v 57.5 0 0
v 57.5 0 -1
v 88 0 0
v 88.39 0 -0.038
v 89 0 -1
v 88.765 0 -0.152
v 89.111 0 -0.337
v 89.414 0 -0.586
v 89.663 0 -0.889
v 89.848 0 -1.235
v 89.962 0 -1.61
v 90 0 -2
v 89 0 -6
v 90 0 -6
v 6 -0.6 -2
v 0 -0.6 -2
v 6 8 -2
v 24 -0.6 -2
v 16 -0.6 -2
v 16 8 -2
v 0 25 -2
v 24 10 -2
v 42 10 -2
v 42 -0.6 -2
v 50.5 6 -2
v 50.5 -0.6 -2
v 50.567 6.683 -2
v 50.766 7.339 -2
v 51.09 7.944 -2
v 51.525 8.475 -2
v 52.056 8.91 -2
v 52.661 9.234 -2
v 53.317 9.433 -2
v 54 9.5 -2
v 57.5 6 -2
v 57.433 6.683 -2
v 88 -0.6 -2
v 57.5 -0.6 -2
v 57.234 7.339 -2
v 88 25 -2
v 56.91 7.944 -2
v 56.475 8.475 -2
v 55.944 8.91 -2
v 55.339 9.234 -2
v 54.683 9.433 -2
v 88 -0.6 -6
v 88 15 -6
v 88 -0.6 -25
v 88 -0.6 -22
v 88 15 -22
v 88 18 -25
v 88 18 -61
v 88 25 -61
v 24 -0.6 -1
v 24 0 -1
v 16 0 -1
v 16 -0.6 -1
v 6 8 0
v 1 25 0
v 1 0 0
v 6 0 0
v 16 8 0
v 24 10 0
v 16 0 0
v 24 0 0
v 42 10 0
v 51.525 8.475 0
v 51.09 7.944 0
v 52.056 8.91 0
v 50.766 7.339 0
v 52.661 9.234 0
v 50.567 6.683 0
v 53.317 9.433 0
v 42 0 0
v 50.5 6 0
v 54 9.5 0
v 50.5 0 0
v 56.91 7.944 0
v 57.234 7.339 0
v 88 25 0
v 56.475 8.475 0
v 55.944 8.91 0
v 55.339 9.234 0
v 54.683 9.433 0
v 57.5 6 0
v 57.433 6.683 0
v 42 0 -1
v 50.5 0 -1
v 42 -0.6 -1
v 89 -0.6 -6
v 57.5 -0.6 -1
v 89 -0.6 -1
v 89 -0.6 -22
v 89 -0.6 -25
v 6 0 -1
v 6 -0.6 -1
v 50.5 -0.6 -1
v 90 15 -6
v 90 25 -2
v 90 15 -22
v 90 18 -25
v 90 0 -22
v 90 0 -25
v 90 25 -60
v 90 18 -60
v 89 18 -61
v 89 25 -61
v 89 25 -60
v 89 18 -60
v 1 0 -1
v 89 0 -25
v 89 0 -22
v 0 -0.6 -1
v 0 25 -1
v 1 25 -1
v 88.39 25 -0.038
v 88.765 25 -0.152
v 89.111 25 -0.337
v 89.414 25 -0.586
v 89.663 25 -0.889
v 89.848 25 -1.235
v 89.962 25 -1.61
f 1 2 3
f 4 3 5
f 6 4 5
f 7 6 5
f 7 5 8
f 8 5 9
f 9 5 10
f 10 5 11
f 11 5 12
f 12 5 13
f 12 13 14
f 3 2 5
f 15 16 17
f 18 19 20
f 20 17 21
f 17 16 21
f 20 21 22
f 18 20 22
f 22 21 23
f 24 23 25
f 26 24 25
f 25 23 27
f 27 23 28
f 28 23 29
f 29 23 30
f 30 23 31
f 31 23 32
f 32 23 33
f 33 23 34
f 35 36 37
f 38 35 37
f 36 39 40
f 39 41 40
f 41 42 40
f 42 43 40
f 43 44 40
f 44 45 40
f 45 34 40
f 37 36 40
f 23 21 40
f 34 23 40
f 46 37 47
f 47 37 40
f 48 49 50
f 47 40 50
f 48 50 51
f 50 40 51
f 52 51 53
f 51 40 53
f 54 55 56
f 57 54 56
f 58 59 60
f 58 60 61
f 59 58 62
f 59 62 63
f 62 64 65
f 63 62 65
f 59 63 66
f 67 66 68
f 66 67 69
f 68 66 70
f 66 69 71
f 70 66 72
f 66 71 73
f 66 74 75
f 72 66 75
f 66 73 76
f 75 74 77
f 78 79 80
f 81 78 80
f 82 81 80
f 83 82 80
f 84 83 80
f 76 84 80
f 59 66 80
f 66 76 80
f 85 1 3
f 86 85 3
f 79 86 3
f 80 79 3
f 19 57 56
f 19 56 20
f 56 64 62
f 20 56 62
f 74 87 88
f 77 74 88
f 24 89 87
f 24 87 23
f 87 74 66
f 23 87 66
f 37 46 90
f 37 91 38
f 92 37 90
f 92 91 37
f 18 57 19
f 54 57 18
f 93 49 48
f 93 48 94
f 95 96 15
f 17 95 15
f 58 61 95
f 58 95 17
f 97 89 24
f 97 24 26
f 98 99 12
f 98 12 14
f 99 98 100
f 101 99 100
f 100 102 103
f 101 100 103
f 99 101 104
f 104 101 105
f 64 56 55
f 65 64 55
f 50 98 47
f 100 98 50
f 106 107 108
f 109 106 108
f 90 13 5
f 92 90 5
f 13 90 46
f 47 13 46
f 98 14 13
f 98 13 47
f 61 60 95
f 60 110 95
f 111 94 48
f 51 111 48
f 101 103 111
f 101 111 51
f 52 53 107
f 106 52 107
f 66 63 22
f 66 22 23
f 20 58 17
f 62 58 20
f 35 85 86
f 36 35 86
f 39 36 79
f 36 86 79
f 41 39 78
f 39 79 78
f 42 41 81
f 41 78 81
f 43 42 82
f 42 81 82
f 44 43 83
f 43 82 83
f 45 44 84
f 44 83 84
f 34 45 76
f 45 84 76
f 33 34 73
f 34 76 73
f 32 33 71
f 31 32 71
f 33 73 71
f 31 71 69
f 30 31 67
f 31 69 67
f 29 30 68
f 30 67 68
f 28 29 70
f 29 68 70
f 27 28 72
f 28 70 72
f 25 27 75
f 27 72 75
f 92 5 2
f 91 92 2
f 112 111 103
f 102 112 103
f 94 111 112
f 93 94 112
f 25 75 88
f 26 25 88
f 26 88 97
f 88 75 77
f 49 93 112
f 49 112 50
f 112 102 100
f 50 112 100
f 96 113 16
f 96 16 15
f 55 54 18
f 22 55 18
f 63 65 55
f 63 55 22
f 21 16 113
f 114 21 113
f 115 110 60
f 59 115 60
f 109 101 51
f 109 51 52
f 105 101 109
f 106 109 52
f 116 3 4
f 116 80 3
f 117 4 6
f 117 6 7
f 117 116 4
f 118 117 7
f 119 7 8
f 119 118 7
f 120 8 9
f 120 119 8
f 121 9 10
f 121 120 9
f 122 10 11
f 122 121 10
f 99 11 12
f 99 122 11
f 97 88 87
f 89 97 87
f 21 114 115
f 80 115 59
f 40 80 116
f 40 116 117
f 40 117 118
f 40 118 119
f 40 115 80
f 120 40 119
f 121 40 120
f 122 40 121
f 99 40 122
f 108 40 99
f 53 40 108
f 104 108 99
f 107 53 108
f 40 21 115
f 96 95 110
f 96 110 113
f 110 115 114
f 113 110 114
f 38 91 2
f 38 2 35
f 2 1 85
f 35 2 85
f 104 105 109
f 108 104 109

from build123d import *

# Parameters (mm, degrees)
P_IDAT_VYSUNUT_M1_DEPTH  = 25
SKICA2_W                 = 88
SKICA2_H                 = 1
P_IDAT_VYSUNUT_M2_DEPTH  = 0.6
ODEBRAT_VYSUNUT_M1_REACH = 63
SKICA5_W                 = 10
SKICA5_H                 = 8.6
SKICA5_W_2               = 18
SKICA5_H_2               = 10.6
ODEBRAT_VYSUNUT_M2_REACH = 92
SKICA6_W                 = 16
SKICA6_H                 = 15.6
SKICA6_W_2               = 19
SKICA6_H_2               = 18.6
FILLET1_R                = 2
CUT_EXTRUDE2_REACH       = 92
SKETCH2_W                = 1
SKETCH2_H                = 18.6


with BuildPart() as part:
    # Skica1 → Přidat vysunutím1 (new body)
    with BuildSketch(Plane(origin=(0, 0, 0), x_dir=(1, 0, 0), z_dir=(0, 1, 0))):
        Polygon((88, 2), (90, 2), (90, 60), (89, 60), (89, 61), (88, 61), align=None)
        Polygon((1, 1), (1, 0), (90, 0), (90, 2), (88, 2), (0, 2), (0, 1), align=None)
    extrude(amount=P_IDAT_VYSUNUT_M1_DEPTH)

    # Skica2 → Přidat vysunutím2 (add)
    with BuildSketch(Plane.XZ):
        with Locations((44, -1.5)):
            Rectangle(SKICA2_W, SKICA2_H)
        Polygon((89, -1), (88, -1), (88, -2), (88, -61), (89, -61), align=None)
    extrude(amount=P_IDAT_VYSUNUT_M2_DEPTH)

    # Skica5 → Odebrat vysunutím1 (cut, up to next)
    with BuildSketch(Plane.XY, mode=Mode.PRIVATE) as odebrat_vysunut_m1_sk1:
        with Locations((11, 3.7)):
            Rectangle(SKICA5_W, SKICA5_H)
    odebrat_vysunut_m1_tool1 = extrude(odebrat_vysunut_m1_sk1.sketch, amount=-ODEBRAT_VYSUNUT_M1_REACH, mode=Mode.PRIVATE) & part.part
    add(odebrat_vysunut_m1_tool1.solids().sort_by_distance((11, 3.7, 0))[0], mode=Mode.SUBTRACT)
    # Skica5 → Odebrat vysunutím1 (cut, up to next)
    with BuildSketch(Plane.XY, mode=Mode.PRIVATE) as odebrat_vysunut_m1_sk2:
        with Locations((33, 4.7)):
            Rectangle(SKICA5_W_2, SKICA5_H_2)
    odebrat_vysunut_m1_tool2 = extrude(odebrat_vysunut_m1_sk2.sketch, amount=-ODEBRAT_VYSUNUT_M1_REACH, mode=Mode.PRIVATE) & part.part
    add(odebrat_vysunut_m1_tool2.solids().sort_by_distance((33, 4.7, 0))[0], mode=Mode.SUBTRACT)
    # Skica5 → Odebrat vysunutím1 (cut, up to next)
    with BuildSketch(Plane.XY, mode=Mode.PRIVATE) as odebrat_vysunut_m1_sk3:
        with BuildLine():
            Line((50.5, 6), (50.5, -0.6))
            Line((50.5, -0.6), (57.5, -0.6))
            Line((57.5, -0.6), (57.5, 6))
            ThreePointArc((57.5, 6), (54, 9.5), (50.5, 6))
        make_face()
    odebrat_vysunut_m1_tool3 = extrude(odebrat_vysunut_m1_sk3.sketch, amount=-ODEBRAT_VYSUNUT_M1_REACH, mode=Mode.PRIVATE) & part.part
    add(odebrat_vysunut_m1_tool3.solids().sort_by_distance((54, 4.107084, 0))[0], mode=Mode.SUBTRACT)

    # Skica6 → Odebrat vysunutím2 (cut, up to next)
    with BuildSketch(Plane(origin=(90, 0, 0), x_dir=(0, 0, -1), z_dir=(1, 0, 0)), mode=Mode.PRIVATE) as odebrat_vysunut_m2_sk1:
        with Locations((14, 7.2)):
            Rectangle(SKICA6_W, SKICA6_H)
    odebrat_vysunut_m2_tool1 = extrude(odebrat_vysunut_m2_sk1.sketch, amount=-ODEBRAT_VYSUNUT_M2_REACH, mode=Mode.PRIVATE) & part.part
    add(odebrat_vysunut_m2_tool1.solids().sort_by_distance((90, 7.2, -14))[0], mode=Mode.SUBTRACT)
    # Skica6 → Odebrat vysunutím2 (cut, up to next)
    with BuildSketch(Plane(origin=(90, 0, 0), x_dir=(0, 0, -1), z_dir=(1, 0, 0)), mode=Mode.PRIVATE) as odebrat_vysunut_m2_sk2:
        with Locations((51.5, 8.7)):
            Rectangle(SKICA6_W_2, SKICA6_H_2)
    odebrat_vysunut_m2_tool2 = extrude(odebrat_vysunut_m2_sk2.sketch, amount=-ODEBRAT_VYSUNUT_M2_REACH, mode=Mode.PRIVATE) & part.part
    add(odebrat_vysunut_m2_tool2.solids().sort_by_distance((90, 8.7, -51.5))[0], mode=Mode.SUBTRACT)
    # Skica6 → Odebrat vysunutím2 (cut, up to next)
    with BuildSketch(Plane(origin=(90, 0, 0), x_dir=(0, 0, -1), z_dir=(1, 0, 0)), mode=Mode.PRIVATE) as odebrat_vysunut_m2_sk3:
        with Locations((33, 8.7)):
            Rectangle(SKICA6_W, SKICA6_H_2)
    odebrat_vysunut_m2_tool3 = extrude(odebrat_vysunut_m2_sk3.sketch, amount=-ODEBRAT_VYSUNUT_M2_REACH, mode=Mode.PRIVATE) & part.part
    add(odebrat_vysunut_m2_tool3.solids().sort_by_distance((90, 8.7, -33))[0], mode=Mode.SUBTRACT)

    # Fillet1
    fillet1_edges = [part.edges().sort_by_distance(p)[0] for p in [
        (90, 12.5, 0),
    ]]
    fillet(fillet1_edges, radius=FILLET1_R)

    # Sketch2 → Cut-Extrude2 (cut, up to next)
    with BuildSketch(Plane(origin=(90, 0, 0), x_dir=(0, 0, -1), z_dir=(1, 0, 0)), mode=Mode.PRIVATE) as cut_extrude2_sk1:
        with Locations((41.5, 8.7)):
            Rectangle(SKETCH2_W, SKETCH2_H)
    cut_extrude2_tool1 = extrude(cut_extrude2_sk1.sketch, amount=-CUT_EXTRUDE2_REACH, mode=Mode.PRIVATE) & part.part
    add(cut_extrude2_tool1.solids().sort_by_distance((90, 8.7, -41.5))[0], mode=Mode.SUBTRACT)


solid = part.part
